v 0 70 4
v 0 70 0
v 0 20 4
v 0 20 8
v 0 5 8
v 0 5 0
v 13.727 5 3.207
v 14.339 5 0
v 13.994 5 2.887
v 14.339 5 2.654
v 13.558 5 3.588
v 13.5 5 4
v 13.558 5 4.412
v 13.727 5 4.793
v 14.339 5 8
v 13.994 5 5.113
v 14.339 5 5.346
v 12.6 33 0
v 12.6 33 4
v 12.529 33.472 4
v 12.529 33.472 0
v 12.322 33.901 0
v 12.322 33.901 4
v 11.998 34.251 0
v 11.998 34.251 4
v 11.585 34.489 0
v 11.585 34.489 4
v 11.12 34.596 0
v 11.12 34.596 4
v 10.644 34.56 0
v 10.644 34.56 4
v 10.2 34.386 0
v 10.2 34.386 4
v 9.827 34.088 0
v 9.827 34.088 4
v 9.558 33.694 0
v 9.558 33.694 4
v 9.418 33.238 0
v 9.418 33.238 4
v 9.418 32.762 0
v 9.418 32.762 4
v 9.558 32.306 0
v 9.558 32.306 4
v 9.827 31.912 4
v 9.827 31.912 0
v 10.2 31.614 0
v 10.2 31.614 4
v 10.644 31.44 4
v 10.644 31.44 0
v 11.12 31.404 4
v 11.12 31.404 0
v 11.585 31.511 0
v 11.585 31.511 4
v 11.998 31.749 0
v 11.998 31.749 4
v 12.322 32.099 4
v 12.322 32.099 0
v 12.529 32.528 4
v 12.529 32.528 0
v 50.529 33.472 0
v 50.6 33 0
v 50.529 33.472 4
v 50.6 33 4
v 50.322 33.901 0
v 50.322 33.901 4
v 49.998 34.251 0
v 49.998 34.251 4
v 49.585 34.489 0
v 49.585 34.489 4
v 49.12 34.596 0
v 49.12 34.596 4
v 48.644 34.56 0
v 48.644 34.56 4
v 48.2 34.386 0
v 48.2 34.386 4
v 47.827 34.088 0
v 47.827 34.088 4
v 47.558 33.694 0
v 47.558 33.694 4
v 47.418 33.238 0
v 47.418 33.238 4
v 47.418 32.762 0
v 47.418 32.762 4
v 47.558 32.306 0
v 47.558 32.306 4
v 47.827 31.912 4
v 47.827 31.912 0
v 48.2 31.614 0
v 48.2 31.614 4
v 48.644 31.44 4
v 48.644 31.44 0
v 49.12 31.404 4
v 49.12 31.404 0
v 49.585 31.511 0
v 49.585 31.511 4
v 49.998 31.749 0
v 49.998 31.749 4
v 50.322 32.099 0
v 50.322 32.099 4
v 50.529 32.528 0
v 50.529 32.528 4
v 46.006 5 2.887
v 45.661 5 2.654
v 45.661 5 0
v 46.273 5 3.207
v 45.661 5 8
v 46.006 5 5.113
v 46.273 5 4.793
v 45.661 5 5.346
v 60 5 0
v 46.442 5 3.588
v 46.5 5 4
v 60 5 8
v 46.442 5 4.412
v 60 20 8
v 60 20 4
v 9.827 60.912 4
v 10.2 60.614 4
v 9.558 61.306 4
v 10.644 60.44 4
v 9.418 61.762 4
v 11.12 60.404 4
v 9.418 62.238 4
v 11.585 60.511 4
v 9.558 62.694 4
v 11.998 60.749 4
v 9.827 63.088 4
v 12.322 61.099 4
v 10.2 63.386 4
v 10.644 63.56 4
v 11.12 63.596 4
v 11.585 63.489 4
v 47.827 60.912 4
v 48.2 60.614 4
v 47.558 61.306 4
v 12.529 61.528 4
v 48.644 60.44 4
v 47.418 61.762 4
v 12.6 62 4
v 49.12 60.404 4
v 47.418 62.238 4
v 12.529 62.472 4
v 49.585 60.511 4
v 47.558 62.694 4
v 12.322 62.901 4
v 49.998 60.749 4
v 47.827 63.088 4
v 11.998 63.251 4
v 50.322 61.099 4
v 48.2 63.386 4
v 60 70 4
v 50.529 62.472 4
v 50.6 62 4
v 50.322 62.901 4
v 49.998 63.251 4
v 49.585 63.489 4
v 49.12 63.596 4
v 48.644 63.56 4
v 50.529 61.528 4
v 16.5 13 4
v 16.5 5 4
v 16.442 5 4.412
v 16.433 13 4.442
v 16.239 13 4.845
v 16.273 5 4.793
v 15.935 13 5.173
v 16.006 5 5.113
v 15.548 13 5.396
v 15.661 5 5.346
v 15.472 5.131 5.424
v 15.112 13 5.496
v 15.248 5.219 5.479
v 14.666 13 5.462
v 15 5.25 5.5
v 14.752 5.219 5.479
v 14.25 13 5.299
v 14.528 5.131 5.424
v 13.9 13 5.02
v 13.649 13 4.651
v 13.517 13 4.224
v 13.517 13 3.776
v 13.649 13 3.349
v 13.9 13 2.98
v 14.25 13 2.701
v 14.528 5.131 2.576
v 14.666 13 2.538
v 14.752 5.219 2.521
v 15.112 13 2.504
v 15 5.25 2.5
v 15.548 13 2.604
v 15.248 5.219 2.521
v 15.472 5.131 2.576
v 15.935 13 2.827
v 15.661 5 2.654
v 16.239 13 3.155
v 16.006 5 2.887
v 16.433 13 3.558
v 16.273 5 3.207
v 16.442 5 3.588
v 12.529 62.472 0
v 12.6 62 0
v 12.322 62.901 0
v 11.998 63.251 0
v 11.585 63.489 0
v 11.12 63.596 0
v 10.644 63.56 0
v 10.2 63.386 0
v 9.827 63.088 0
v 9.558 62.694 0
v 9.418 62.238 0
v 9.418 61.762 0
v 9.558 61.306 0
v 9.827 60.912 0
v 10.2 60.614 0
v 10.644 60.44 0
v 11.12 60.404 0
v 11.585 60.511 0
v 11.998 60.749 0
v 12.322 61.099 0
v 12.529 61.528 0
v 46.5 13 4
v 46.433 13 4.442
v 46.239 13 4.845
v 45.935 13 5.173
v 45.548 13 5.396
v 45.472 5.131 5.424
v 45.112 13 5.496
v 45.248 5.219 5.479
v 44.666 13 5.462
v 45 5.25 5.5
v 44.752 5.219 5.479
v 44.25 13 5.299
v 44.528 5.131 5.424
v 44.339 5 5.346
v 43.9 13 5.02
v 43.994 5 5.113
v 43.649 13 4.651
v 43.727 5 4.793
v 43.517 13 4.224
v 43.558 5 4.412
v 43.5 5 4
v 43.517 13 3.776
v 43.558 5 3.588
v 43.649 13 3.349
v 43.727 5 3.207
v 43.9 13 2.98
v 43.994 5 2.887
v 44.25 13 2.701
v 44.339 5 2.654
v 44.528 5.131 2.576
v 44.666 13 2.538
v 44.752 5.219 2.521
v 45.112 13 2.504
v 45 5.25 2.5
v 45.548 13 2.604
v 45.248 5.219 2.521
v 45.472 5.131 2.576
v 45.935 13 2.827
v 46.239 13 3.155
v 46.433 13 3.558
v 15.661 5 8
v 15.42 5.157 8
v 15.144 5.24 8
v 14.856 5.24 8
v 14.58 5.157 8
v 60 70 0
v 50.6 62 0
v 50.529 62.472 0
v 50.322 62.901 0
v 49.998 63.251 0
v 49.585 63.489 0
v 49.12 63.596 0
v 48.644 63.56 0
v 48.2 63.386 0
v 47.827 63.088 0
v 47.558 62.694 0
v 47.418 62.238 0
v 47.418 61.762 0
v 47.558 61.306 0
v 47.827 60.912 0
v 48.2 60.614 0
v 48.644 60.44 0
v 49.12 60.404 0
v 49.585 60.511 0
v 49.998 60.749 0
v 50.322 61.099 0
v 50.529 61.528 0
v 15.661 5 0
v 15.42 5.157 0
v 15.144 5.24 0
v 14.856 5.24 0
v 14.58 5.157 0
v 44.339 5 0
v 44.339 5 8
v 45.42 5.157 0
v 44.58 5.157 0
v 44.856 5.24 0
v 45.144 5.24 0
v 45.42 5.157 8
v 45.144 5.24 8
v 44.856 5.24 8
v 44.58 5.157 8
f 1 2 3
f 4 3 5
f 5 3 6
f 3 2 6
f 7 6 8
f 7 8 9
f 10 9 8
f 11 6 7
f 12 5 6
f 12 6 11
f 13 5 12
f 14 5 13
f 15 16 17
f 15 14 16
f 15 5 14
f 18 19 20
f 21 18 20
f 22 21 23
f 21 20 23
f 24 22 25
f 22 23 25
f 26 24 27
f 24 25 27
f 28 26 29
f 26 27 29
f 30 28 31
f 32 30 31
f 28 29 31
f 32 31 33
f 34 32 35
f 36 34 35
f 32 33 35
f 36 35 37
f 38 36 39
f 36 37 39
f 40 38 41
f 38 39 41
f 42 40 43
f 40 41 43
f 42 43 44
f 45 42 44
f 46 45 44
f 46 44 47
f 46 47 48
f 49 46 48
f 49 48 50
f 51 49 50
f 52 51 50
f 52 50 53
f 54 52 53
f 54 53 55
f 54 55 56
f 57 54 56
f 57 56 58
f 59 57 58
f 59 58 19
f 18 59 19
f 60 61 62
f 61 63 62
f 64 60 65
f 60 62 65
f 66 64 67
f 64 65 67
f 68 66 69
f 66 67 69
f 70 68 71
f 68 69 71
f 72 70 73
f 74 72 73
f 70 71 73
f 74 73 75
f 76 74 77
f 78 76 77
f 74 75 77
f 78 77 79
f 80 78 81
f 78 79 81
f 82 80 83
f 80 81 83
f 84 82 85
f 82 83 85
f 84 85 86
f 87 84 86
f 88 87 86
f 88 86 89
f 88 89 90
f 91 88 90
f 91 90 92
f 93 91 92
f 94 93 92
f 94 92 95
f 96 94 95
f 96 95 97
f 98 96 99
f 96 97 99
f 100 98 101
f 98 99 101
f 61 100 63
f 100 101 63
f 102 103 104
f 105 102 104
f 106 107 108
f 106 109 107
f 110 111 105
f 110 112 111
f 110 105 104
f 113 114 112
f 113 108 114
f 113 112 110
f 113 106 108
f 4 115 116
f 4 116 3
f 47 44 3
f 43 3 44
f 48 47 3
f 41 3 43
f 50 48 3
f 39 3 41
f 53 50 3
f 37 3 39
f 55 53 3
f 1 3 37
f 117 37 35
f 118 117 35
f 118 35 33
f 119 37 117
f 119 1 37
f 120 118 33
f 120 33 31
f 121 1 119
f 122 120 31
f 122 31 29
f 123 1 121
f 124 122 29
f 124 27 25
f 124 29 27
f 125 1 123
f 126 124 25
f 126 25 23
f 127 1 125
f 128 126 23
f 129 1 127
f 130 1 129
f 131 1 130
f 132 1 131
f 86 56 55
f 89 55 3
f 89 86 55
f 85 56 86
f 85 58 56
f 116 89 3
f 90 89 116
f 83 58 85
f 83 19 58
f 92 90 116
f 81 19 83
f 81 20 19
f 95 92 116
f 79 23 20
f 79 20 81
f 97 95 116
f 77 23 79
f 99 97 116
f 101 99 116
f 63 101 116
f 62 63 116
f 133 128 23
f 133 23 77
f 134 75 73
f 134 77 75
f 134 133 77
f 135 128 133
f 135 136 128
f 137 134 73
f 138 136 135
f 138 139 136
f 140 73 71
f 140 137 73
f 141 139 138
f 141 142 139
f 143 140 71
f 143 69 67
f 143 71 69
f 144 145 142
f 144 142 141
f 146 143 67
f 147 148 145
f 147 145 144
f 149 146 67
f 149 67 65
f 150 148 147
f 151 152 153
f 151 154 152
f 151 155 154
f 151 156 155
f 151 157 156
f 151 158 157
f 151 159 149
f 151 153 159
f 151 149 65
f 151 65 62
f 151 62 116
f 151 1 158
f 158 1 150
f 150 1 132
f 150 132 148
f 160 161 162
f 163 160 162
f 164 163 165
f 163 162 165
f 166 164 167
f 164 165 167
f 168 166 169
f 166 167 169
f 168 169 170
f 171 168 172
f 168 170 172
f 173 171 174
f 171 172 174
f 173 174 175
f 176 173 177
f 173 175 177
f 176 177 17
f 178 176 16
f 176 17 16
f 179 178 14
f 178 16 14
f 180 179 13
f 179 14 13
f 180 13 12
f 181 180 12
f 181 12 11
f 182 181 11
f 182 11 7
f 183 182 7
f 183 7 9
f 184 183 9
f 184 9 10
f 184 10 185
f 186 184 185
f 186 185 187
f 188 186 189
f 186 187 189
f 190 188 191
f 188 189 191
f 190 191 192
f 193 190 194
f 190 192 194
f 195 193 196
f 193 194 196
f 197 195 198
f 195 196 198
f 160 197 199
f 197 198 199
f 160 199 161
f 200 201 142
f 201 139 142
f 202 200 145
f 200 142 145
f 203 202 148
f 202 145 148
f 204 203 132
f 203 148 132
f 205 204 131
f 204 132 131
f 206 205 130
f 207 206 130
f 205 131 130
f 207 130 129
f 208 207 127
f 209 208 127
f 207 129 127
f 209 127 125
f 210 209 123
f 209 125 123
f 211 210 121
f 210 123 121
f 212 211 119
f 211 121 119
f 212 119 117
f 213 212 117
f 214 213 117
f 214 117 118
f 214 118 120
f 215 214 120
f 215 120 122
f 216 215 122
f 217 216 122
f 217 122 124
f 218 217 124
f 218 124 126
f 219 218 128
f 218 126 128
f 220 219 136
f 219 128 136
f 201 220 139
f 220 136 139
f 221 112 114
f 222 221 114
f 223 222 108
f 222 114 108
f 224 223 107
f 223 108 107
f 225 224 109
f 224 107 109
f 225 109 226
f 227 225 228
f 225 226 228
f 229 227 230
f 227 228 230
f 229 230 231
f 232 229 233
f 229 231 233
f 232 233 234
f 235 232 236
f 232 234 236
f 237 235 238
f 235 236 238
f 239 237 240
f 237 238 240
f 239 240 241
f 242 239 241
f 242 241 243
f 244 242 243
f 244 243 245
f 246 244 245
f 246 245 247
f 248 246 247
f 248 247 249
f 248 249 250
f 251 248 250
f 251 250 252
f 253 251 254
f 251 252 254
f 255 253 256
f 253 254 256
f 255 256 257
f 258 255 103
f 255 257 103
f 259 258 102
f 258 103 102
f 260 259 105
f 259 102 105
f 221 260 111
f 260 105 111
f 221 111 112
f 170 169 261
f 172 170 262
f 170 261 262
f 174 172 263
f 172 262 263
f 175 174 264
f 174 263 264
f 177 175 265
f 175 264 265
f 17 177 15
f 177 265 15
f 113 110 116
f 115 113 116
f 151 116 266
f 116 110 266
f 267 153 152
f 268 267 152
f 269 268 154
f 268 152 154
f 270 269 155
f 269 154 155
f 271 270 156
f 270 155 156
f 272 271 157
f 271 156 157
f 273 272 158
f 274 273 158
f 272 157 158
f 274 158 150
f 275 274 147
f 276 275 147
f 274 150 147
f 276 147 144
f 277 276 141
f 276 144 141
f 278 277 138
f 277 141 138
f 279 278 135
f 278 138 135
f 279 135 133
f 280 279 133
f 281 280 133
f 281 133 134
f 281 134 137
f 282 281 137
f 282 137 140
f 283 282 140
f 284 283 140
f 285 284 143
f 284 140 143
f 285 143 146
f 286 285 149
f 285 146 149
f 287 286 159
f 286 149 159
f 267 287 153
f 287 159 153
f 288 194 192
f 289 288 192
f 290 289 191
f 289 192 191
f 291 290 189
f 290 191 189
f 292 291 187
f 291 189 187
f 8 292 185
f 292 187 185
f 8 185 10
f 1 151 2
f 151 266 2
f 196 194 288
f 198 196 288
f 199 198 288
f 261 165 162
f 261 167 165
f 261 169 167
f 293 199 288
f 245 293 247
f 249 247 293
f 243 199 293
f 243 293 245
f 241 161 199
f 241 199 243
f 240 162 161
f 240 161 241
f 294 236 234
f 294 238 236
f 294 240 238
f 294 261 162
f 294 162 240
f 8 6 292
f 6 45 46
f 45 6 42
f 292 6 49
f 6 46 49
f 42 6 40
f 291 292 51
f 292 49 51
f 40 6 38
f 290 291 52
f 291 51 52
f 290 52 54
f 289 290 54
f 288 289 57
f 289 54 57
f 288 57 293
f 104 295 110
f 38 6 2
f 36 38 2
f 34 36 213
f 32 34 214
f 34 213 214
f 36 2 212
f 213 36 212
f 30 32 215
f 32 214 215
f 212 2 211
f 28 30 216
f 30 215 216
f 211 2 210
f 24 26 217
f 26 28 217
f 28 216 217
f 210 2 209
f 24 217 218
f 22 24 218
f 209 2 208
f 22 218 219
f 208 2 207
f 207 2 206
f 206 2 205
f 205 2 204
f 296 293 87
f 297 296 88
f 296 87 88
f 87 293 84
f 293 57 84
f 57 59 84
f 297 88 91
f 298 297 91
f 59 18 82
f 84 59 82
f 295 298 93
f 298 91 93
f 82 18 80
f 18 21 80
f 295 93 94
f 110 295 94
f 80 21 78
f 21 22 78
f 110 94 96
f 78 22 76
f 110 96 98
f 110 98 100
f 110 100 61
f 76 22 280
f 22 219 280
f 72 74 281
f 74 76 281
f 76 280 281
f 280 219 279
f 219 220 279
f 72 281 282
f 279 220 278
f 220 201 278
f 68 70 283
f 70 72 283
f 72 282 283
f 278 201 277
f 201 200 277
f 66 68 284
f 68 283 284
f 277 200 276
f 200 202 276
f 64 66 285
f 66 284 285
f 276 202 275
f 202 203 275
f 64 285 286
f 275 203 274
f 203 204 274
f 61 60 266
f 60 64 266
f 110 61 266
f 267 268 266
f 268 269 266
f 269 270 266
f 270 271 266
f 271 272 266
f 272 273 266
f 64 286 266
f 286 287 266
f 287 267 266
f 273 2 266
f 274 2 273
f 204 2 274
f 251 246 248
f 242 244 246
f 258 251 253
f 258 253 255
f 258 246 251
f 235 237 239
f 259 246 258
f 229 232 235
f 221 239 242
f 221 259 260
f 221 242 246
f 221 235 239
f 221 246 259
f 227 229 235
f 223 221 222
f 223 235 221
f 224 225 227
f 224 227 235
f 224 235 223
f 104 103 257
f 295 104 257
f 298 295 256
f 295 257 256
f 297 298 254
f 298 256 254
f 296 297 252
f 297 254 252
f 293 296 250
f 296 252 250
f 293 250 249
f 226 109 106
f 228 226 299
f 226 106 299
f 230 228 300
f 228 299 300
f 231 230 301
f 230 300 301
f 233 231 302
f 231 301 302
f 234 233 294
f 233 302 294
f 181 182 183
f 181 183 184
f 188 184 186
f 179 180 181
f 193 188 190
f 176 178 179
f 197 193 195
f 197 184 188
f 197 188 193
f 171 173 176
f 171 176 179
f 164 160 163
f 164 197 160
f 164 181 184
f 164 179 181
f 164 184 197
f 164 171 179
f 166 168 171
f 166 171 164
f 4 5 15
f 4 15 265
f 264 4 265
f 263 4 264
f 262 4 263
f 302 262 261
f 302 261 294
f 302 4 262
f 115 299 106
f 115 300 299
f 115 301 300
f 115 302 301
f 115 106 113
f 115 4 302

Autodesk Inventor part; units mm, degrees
ref_plane "YZ Plane" through (0, 0, 0) normal (1, 0, 0) x (0, 1, 0)
ref_plane "XZ Plane" through (0, 0, 0) normal (0, 1, 0) x (-1, 0, 0)
ref_plane "XY Plane" through (0, 0, 0) normal (0, 0, 1) x (1, 0, 0)
sketch "스케치1" plane through (0, 0, 0) normal (0, 0, 1) x (1, 0, 0)
  line L0 (0, 0) -> (60, 0)
  line L1 (60, 0) -> (60, 70)
  line L2 (60, 70) -> (0, 70)
  line L3 (0, 70) -> (0, 0)
  dimension "d0" = 60
  dimension "d1" = 70
extrude "돌출1" add sketch "스케치1" along normal blind 8
sketch "스케치2" plane through (0, 0, 8) normal (0, 0, 1) x (1, 0, 0)
  line L0 (0, 0) -> (60, 0) projected
  line L1 (60, 0) -> (60, 70) projected
  line L2 (60, 70) -> (0, 70) projected
  line L3 (0, 70) -> (0, 0) projected
  line L4 (60, 0) -> (60, 70) projected
  line L5 (0, 70) -> (60, 70)
  line L6 (60, 70) -> (60, 20)
  line L7 (60, 20) -> (0, 20)
  line L8 (0, 20) -> (0, 70)
extrude "돌출2" cut sketch "스케치2" against normal blind 4 contours L3 L2 L1 L7
sketch "스케치3" plane through (0, 0, 4) normal (0, 0, 1) x (1, 0, 0)
  line L0 (60, 70) -> (60, 20) projected
  line L1 (0, 70) -> (60, 70) projected
  line L2 (0, 20) -> (0, 70) projected
  line L3 (60, 20) -> (0, 20) projected
  line L4 (60, 70) -> (0, 70) projected
  circle A0 centre (11, 62) radius 1.6
  circle A1 centre (49, 62) radius 1.6
  circle A2 centre (11, 33) radius 1.6
  circle A3 centre (49, 33) radius 1.6
  point P0 (0, 0)
  dimension "d8" = 3.2
  dimension "d9" = 3.2
  dimension "d14" = 3.2
  dimension "d15" = 3.2
  dimension "d16" = 11
  dimension "d17" = 8
  dimension "d18" = 8
  dimension "d19" = 11
  dimension "d20" = 29
  dimension "d21" = 11
  dimension "d22" = 11
  dimension "d23" = 29
extrude "돌출3" cut sketch "스케치3" against normal blind 4 contours A0 | A1 | A2 | A3
sketch "스케치4" plane through (0, 0, 0) normal (0, -1, 0) x (1, 0, 0)
  line L0 (0, 0) -> (60, 0) projected
  line L1 (60, 0) -> (60, 8) projected
  line L2 (0, 8) -> (60, 8) projected
  line L3 (0, 0) -> (0, 8) projected
extrude "돌출4" cut sketch "스케치4" against normal blind 5
sketch "스케치5" plane through (0, 5, 0) normal (0, -1, 0) x (1, 0, 0)
  circle A0 centre (15, 4) radius 1.5
  circle A1 centre (45, 4) radius 1.5
  line L0 (60, 0) -> (0, 0) projected
  line L1 (0, 8) -> (60, 8) projected
  line L2 (0, 0) -> (0, 8) projected
  line L3 (60, 8) -> (60, 0) projected
  dimension "d24" = 3
  dimension "d25" = 3
  dimension "d26" = 4
  dimension "d27" = 4
  dimension "d28" = 15
  dimension "d29" = 15
extrude "돌출5" cut sketch "스케치5" against normal blind 8 contours A0 | A1
sketch "스케치6" plane through (0, 0, 8) normal (0, 0, 1) x (1, 0, 0)
  line L0 (16.5, 13) -> (13.5, 13) projected
  line L1 (16.5, 5) -> (13.5, 5) projected
  line L2 (46.5, 5) -> (43.5, 5) projected
  line L3 (46.5, 13) -> (43.5, 13) projected
  line L4 (46.5, 5) -> (43.5, 5) projected
  arc A0 (15.6614, 5) -> (14.3386, 5) centre (15, 4.25) ccw
  arc A1 (45.6614, 5) -> (44.3386, 5) centre (45, 4.25) ccw
  point P0 (0, 0)
  dimension "d32" = 2
  dimension "d33" = 2
  dimension "d34" = 0.75
  dimension "d35" = 0.75
extrude "돌출6" cut sketch "스케치6" against normal blind 8
properties part number "앞뒷면PSD받침대" material "ABS 플라스틱"
